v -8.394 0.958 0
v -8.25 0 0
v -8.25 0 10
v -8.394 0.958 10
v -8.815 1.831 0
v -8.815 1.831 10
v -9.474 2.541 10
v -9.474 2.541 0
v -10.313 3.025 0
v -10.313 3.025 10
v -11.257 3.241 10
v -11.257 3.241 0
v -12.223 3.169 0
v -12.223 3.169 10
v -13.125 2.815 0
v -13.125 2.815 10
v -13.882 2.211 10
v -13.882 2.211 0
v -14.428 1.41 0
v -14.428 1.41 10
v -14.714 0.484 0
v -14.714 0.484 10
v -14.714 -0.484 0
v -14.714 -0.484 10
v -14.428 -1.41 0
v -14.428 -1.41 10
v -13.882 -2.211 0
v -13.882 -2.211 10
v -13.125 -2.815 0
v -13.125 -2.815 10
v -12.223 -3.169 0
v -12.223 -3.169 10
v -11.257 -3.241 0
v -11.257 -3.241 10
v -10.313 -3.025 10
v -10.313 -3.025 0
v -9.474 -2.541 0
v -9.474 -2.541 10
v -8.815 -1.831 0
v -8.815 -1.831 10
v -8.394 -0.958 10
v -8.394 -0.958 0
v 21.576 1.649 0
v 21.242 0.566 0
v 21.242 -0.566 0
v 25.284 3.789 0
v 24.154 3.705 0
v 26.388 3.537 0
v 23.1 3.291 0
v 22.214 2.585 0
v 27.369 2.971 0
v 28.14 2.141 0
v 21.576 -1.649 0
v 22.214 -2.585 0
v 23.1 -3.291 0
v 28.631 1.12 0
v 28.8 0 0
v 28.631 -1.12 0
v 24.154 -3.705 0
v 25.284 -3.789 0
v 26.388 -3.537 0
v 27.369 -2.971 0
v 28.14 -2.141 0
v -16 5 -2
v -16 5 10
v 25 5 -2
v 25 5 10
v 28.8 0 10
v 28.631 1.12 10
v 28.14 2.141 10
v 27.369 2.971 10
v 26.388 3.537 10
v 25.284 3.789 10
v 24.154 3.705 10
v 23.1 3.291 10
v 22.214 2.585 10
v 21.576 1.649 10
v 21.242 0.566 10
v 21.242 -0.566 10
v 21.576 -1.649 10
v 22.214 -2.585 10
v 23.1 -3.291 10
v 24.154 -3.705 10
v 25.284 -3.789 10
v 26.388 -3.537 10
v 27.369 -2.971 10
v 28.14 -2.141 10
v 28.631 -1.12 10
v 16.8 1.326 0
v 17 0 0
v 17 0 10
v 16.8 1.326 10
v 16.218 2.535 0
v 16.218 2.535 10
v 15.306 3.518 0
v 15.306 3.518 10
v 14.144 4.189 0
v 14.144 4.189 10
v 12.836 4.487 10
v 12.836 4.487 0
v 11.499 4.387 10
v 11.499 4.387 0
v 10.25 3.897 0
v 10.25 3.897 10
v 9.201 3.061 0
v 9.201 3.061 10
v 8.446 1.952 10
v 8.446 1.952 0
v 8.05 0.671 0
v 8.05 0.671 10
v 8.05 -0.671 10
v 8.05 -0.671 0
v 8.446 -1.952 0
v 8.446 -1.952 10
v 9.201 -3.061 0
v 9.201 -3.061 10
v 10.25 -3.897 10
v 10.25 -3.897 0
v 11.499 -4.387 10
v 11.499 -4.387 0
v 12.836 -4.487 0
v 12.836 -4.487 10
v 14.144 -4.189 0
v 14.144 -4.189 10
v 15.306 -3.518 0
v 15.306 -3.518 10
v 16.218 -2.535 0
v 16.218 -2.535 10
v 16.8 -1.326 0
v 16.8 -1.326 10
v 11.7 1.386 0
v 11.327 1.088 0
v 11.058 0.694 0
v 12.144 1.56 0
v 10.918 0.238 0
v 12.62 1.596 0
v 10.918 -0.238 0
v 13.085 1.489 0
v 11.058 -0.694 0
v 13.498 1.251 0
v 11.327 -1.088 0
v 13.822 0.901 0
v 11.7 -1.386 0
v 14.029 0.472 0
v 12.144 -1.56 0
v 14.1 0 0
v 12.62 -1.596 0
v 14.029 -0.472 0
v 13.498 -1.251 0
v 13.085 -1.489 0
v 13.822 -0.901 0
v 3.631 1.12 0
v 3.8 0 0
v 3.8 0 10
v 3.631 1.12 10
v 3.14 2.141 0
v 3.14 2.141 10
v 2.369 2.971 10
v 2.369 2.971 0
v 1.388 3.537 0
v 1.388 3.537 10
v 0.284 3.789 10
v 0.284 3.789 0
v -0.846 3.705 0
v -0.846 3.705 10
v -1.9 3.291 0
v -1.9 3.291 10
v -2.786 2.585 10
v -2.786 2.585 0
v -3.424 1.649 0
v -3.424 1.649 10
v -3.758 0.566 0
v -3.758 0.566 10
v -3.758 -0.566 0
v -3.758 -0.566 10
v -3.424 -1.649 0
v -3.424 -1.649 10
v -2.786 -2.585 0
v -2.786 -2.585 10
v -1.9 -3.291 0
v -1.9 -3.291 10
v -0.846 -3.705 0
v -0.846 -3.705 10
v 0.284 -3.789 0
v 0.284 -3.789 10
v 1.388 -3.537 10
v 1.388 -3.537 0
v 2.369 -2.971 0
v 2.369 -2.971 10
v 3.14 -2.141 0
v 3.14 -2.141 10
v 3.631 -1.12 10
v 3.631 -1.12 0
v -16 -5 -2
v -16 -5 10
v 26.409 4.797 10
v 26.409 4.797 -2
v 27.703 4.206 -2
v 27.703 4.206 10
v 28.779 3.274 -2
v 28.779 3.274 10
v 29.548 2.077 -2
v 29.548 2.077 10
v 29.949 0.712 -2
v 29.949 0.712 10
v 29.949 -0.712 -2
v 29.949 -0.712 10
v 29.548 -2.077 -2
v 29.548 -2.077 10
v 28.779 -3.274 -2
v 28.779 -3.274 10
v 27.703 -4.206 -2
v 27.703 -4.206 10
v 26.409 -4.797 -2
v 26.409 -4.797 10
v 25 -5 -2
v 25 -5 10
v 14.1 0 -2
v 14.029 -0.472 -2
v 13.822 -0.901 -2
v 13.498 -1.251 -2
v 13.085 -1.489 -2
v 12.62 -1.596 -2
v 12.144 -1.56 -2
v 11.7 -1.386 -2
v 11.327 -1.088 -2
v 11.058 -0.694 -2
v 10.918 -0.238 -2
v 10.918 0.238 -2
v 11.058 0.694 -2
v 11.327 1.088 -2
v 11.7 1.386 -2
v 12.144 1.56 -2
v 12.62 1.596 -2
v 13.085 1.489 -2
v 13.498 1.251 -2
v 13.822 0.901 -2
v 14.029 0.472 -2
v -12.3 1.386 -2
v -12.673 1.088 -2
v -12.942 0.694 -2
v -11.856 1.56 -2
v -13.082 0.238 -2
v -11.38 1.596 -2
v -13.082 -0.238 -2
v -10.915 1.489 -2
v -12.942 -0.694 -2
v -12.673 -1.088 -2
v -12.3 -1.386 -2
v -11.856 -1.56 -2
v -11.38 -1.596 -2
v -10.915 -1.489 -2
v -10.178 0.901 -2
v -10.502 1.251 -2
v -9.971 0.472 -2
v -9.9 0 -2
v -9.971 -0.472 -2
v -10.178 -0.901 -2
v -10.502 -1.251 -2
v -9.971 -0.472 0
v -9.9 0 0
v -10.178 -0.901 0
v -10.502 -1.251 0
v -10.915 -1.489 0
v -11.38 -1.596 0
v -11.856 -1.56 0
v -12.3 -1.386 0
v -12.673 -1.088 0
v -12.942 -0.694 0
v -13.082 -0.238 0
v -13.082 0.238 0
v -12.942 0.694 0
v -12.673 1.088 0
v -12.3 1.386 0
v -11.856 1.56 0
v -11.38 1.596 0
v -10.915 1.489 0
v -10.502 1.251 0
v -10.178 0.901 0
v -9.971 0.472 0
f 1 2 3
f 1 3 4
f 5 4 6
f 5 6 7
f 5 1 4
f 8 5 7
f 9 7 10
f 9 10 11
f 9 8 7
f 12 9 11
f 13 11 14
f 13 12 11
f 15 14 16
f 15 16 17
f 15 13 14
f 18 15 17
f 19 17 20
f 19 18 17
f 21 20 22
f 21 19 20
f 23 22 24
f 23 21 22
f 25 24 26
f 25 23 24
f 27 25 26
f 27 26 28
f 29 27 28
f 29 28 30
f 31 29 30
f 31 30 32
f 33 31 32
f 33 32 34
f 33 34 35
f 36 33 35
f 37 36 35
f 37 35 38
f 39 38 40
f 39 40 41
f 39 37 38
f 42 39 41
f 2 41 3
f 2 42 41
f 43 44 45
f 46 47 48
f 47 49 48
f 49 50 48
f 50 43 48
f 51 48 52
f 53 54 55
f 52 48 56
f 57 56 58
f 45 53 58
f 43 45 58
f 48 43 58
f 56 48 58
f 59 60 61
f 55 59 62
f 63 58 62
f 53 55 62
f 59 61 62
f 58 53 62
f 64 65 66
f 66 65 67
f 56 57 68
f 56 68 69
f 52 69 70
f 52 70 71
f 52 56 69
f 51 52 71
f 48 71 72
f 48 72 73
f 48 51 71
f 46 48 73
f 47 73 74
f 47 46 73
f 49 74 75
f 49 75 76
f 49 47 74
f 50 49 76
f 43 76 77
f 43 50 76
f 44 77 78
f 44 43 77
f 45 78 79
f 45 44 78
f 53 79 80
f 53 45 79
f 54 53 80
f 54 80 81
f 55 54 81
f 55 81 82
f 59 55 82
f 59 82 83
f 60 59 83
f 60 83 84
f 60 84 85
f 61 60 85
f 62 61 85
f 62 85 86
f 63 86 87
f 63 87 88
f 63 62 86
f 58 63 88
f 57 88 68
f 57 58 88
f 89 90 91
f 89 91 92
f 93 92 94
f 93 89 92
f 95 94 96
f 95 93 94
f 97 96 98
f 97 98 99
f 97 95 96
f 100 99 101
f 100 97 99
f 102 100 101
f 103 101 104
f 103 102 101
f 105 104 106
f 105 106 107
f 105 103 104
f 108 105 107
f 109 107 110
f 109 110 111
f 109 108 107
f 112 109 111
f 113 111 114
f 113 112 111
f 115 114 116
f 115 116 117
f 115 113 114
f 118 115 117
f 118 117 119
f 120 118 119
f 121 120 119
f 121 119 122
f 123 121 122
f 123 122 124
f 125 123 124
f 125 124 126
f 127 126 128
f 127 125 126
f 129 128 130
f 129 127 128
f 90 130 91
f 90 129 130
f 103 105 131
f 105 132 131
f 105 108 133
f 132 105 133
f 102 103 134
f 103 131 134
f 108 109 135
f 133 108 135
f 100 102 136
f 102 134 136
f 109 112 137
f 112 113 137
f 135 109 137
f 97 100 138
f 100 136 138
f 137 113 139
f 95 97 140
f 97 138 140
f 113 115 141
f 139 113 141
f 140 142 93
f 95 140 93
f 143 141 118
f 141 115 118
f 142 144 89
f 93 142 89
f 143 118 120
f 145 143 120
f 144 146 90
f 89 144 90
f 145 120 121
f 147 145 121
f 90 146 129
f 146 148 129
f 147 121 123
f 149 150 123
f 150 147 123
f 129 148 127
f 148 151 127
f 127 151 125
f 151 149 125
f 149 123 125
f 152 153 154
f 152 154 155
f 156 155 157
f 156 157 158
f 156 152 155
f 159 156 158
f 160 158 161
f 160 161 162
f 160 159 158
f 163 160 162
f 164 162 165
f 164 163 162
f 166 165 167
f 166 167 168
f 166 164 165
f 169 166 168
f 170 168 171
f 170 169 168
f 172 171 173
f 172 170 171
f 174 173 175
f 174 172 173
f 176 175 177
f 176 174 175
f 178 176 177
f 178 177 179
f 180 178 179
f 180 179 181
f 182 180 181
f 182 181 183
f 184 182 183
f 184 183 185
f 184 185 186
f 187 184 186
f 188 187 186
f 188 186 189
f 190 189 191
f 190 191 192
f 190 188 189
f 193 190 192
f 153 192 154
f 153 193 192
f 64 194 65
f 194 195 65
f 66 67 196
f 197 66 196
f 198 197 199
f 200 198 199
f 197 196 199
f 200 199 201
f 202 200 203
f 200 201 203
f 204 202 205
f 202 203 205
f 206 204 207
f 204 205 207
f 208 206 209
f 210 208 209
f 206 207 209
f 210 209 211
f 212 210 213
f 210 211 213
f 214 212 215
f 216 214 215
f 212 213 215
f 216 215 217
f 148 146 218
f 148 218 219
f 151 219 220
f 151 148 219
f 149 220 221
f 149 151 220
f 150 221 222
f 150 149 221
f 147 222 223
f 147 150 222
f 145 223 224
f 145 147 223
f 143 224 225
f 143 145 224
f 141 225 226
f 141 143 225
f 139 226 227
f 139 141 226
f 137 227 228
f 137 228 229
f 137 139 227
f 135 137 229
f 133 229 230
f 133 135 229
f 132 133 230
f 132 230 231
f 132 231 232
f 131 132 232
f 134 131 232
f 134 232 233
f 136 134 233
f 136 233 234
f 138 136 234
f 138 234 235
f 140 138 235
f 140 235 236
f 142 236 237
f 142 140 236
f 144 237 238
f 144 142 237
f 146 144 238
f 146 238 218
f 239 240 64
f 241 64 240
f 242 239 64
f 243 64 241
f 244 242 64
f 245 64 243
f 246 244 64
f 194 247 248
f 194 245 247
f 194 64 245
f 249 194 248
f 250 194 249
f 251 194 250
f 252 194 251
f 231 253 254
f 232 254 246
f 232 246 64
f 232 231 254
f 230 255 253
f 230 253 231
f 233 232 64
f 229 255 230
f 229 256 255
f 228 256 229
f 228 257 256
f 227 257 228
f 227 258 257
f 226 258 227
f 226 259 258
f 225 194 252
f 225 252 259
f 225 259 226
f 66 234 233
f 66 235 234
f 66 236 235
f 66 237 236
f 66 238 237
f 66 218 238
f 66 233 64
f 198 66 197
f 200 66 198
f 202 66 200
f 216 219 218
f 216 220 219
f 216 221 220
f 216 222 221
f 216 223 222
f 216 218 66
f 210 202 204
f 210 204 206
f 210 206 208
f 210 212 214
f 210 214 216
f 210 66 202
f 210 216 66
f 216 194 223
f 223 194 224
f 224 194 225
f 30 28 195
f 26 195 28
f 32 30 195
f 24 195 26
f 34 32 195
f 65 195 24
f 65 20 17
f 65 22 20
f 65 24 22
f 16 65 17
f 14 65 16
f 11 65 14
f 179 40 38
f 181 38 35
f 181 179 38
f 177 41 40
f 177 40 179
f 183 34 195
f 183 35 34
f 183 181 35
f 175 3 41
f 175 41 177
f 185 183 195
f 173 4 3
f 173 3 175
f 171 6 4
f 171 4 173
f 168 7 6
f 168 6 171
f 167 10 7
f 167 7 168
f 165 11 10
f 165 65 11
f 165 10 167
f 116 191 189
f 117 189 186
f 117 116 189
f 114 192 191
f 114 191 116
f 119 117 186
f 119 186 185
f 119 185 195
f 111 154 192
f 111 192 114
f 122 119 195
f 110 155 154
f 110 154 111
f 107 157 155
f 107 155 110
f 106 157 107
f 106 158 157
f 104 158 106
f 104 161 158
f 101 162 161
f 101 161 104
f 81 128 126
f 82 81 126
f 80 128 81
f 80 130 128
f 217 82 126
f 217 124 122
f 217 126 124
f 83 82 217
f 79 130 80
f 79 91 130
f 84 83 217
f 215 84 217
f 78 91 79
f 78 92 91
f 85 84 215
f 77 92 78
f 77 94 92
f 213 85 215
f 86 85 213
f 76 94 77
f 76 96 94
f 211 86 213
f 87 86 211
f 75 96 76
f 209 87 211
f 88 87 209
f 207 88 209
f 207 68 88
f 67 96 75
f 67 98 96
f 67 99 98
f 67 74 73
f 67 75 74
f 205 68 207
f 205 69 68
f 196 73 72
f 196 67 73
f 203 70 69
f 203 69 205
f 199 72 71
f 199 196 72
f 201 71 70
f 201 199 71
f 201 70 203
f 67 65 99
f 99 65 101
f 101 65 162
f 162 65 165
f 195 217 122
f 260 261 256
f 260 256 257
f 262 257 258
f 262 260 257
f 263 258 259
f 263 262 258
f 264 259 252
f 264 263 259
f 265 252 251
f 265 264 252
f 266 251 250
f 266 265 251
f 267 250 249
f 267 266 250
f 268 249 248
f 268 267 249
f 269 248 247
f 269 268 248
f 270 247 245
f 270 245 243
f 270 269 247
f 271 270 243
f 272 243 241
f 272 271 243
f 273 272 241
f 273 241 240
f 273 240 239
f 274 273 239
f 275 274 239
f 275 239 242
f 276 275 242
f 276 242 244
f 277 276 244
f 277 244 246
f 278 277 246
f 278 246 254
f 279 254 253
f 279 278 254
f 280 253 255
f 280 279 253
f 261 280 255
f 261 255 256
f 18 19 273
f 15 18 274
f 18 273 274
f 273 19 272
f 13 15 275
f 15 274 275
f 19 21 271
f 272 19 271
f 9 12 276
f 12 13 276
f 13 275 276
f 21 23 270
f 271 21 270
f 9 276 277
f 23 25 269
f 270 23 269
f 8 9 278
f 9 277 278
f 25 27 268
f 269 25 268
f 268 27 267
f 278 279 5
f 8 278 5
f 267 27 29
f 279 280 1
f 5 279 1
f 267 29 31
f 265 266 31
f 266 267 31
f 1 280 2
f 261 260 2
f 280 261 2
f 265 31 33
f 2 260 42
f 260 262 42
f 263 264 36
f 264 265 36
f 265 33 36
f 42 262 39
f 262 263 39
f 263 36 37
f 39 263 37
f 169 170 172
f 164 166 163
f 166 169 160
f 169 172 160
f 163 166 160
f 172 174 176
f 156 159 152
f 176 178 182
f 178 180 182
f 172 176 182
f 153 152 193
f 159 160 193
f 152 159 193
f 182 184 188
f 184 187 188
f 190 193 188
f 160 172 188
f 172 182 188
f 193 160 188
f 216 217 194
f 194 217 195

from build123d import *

# Parameters (mm, degrees)
SKETCH_R     = 3.8
SKETCH_R_2   = 4.5
SKETCH_R_3   = 3.25
PAD_DEPTH    = 10
SKETCH001_R  = 1.6
PAD001_DEPTH = 2


with BuildPart() as part:
    # Sketch → Pad (new body)
    with BuildSketch(Plane.XY):
        with BuildLine():
            ThreePointArc((25, -5), (30, 0), (25, 5))
            Line((0, 5), (25, 5))
            Line((0, 5), (-16, 5))
            Line((-16, 5), (-16, -5))
            Line((-16, -5), (0, -5))
            Line((0, -5), (25, -5))
        make_face()
        Circle(SKETCH_R, mode=Mode.SUBTRACT)
        with Locations((25, 0)):
            Circle(SKETCH_R, mode=Mode.SUBTRACT)
        with Locations((12.5, 0)):
            Circle(SKETCH_R_2, mode=Mode.SUBTRACT)
        with Locations((-11.5, 0)):
            Circle(SKETCH_R_3, mode=Mode.SUBTRACT)
    extrude(amount=PAD_DEPTH)

    # Sketch001 (on Face11 of Pad) → Pad001 (join)
    with BuildSketch(Plane(origin=(0, 0, 0), x_dir=(1, 0, 0), z_dir=(0, 0, -1))):
        with BuildLine():
            ThreePointArc((25, -5), (30, 0), (25, 5))
            Line((0, 5), (25, 5))
            Line((0, 5), (-16, 5))
            Line((-16, 5), (-16, -5))
            Line((-16, -5), (0, -5))
            Line((0, -5), (25, -5))
        make_face()
        with Locations((12.5, 0)):
            Circle(SKETCH001_R, mode=Mode.SUBTRACT)
        with Locations((-11.5, 0)):
            Circle(SKETCH001_R, mode=Mode.SUBTRACT)
    extrude(amount=PAD001_DEPTH)


solid = part.part
